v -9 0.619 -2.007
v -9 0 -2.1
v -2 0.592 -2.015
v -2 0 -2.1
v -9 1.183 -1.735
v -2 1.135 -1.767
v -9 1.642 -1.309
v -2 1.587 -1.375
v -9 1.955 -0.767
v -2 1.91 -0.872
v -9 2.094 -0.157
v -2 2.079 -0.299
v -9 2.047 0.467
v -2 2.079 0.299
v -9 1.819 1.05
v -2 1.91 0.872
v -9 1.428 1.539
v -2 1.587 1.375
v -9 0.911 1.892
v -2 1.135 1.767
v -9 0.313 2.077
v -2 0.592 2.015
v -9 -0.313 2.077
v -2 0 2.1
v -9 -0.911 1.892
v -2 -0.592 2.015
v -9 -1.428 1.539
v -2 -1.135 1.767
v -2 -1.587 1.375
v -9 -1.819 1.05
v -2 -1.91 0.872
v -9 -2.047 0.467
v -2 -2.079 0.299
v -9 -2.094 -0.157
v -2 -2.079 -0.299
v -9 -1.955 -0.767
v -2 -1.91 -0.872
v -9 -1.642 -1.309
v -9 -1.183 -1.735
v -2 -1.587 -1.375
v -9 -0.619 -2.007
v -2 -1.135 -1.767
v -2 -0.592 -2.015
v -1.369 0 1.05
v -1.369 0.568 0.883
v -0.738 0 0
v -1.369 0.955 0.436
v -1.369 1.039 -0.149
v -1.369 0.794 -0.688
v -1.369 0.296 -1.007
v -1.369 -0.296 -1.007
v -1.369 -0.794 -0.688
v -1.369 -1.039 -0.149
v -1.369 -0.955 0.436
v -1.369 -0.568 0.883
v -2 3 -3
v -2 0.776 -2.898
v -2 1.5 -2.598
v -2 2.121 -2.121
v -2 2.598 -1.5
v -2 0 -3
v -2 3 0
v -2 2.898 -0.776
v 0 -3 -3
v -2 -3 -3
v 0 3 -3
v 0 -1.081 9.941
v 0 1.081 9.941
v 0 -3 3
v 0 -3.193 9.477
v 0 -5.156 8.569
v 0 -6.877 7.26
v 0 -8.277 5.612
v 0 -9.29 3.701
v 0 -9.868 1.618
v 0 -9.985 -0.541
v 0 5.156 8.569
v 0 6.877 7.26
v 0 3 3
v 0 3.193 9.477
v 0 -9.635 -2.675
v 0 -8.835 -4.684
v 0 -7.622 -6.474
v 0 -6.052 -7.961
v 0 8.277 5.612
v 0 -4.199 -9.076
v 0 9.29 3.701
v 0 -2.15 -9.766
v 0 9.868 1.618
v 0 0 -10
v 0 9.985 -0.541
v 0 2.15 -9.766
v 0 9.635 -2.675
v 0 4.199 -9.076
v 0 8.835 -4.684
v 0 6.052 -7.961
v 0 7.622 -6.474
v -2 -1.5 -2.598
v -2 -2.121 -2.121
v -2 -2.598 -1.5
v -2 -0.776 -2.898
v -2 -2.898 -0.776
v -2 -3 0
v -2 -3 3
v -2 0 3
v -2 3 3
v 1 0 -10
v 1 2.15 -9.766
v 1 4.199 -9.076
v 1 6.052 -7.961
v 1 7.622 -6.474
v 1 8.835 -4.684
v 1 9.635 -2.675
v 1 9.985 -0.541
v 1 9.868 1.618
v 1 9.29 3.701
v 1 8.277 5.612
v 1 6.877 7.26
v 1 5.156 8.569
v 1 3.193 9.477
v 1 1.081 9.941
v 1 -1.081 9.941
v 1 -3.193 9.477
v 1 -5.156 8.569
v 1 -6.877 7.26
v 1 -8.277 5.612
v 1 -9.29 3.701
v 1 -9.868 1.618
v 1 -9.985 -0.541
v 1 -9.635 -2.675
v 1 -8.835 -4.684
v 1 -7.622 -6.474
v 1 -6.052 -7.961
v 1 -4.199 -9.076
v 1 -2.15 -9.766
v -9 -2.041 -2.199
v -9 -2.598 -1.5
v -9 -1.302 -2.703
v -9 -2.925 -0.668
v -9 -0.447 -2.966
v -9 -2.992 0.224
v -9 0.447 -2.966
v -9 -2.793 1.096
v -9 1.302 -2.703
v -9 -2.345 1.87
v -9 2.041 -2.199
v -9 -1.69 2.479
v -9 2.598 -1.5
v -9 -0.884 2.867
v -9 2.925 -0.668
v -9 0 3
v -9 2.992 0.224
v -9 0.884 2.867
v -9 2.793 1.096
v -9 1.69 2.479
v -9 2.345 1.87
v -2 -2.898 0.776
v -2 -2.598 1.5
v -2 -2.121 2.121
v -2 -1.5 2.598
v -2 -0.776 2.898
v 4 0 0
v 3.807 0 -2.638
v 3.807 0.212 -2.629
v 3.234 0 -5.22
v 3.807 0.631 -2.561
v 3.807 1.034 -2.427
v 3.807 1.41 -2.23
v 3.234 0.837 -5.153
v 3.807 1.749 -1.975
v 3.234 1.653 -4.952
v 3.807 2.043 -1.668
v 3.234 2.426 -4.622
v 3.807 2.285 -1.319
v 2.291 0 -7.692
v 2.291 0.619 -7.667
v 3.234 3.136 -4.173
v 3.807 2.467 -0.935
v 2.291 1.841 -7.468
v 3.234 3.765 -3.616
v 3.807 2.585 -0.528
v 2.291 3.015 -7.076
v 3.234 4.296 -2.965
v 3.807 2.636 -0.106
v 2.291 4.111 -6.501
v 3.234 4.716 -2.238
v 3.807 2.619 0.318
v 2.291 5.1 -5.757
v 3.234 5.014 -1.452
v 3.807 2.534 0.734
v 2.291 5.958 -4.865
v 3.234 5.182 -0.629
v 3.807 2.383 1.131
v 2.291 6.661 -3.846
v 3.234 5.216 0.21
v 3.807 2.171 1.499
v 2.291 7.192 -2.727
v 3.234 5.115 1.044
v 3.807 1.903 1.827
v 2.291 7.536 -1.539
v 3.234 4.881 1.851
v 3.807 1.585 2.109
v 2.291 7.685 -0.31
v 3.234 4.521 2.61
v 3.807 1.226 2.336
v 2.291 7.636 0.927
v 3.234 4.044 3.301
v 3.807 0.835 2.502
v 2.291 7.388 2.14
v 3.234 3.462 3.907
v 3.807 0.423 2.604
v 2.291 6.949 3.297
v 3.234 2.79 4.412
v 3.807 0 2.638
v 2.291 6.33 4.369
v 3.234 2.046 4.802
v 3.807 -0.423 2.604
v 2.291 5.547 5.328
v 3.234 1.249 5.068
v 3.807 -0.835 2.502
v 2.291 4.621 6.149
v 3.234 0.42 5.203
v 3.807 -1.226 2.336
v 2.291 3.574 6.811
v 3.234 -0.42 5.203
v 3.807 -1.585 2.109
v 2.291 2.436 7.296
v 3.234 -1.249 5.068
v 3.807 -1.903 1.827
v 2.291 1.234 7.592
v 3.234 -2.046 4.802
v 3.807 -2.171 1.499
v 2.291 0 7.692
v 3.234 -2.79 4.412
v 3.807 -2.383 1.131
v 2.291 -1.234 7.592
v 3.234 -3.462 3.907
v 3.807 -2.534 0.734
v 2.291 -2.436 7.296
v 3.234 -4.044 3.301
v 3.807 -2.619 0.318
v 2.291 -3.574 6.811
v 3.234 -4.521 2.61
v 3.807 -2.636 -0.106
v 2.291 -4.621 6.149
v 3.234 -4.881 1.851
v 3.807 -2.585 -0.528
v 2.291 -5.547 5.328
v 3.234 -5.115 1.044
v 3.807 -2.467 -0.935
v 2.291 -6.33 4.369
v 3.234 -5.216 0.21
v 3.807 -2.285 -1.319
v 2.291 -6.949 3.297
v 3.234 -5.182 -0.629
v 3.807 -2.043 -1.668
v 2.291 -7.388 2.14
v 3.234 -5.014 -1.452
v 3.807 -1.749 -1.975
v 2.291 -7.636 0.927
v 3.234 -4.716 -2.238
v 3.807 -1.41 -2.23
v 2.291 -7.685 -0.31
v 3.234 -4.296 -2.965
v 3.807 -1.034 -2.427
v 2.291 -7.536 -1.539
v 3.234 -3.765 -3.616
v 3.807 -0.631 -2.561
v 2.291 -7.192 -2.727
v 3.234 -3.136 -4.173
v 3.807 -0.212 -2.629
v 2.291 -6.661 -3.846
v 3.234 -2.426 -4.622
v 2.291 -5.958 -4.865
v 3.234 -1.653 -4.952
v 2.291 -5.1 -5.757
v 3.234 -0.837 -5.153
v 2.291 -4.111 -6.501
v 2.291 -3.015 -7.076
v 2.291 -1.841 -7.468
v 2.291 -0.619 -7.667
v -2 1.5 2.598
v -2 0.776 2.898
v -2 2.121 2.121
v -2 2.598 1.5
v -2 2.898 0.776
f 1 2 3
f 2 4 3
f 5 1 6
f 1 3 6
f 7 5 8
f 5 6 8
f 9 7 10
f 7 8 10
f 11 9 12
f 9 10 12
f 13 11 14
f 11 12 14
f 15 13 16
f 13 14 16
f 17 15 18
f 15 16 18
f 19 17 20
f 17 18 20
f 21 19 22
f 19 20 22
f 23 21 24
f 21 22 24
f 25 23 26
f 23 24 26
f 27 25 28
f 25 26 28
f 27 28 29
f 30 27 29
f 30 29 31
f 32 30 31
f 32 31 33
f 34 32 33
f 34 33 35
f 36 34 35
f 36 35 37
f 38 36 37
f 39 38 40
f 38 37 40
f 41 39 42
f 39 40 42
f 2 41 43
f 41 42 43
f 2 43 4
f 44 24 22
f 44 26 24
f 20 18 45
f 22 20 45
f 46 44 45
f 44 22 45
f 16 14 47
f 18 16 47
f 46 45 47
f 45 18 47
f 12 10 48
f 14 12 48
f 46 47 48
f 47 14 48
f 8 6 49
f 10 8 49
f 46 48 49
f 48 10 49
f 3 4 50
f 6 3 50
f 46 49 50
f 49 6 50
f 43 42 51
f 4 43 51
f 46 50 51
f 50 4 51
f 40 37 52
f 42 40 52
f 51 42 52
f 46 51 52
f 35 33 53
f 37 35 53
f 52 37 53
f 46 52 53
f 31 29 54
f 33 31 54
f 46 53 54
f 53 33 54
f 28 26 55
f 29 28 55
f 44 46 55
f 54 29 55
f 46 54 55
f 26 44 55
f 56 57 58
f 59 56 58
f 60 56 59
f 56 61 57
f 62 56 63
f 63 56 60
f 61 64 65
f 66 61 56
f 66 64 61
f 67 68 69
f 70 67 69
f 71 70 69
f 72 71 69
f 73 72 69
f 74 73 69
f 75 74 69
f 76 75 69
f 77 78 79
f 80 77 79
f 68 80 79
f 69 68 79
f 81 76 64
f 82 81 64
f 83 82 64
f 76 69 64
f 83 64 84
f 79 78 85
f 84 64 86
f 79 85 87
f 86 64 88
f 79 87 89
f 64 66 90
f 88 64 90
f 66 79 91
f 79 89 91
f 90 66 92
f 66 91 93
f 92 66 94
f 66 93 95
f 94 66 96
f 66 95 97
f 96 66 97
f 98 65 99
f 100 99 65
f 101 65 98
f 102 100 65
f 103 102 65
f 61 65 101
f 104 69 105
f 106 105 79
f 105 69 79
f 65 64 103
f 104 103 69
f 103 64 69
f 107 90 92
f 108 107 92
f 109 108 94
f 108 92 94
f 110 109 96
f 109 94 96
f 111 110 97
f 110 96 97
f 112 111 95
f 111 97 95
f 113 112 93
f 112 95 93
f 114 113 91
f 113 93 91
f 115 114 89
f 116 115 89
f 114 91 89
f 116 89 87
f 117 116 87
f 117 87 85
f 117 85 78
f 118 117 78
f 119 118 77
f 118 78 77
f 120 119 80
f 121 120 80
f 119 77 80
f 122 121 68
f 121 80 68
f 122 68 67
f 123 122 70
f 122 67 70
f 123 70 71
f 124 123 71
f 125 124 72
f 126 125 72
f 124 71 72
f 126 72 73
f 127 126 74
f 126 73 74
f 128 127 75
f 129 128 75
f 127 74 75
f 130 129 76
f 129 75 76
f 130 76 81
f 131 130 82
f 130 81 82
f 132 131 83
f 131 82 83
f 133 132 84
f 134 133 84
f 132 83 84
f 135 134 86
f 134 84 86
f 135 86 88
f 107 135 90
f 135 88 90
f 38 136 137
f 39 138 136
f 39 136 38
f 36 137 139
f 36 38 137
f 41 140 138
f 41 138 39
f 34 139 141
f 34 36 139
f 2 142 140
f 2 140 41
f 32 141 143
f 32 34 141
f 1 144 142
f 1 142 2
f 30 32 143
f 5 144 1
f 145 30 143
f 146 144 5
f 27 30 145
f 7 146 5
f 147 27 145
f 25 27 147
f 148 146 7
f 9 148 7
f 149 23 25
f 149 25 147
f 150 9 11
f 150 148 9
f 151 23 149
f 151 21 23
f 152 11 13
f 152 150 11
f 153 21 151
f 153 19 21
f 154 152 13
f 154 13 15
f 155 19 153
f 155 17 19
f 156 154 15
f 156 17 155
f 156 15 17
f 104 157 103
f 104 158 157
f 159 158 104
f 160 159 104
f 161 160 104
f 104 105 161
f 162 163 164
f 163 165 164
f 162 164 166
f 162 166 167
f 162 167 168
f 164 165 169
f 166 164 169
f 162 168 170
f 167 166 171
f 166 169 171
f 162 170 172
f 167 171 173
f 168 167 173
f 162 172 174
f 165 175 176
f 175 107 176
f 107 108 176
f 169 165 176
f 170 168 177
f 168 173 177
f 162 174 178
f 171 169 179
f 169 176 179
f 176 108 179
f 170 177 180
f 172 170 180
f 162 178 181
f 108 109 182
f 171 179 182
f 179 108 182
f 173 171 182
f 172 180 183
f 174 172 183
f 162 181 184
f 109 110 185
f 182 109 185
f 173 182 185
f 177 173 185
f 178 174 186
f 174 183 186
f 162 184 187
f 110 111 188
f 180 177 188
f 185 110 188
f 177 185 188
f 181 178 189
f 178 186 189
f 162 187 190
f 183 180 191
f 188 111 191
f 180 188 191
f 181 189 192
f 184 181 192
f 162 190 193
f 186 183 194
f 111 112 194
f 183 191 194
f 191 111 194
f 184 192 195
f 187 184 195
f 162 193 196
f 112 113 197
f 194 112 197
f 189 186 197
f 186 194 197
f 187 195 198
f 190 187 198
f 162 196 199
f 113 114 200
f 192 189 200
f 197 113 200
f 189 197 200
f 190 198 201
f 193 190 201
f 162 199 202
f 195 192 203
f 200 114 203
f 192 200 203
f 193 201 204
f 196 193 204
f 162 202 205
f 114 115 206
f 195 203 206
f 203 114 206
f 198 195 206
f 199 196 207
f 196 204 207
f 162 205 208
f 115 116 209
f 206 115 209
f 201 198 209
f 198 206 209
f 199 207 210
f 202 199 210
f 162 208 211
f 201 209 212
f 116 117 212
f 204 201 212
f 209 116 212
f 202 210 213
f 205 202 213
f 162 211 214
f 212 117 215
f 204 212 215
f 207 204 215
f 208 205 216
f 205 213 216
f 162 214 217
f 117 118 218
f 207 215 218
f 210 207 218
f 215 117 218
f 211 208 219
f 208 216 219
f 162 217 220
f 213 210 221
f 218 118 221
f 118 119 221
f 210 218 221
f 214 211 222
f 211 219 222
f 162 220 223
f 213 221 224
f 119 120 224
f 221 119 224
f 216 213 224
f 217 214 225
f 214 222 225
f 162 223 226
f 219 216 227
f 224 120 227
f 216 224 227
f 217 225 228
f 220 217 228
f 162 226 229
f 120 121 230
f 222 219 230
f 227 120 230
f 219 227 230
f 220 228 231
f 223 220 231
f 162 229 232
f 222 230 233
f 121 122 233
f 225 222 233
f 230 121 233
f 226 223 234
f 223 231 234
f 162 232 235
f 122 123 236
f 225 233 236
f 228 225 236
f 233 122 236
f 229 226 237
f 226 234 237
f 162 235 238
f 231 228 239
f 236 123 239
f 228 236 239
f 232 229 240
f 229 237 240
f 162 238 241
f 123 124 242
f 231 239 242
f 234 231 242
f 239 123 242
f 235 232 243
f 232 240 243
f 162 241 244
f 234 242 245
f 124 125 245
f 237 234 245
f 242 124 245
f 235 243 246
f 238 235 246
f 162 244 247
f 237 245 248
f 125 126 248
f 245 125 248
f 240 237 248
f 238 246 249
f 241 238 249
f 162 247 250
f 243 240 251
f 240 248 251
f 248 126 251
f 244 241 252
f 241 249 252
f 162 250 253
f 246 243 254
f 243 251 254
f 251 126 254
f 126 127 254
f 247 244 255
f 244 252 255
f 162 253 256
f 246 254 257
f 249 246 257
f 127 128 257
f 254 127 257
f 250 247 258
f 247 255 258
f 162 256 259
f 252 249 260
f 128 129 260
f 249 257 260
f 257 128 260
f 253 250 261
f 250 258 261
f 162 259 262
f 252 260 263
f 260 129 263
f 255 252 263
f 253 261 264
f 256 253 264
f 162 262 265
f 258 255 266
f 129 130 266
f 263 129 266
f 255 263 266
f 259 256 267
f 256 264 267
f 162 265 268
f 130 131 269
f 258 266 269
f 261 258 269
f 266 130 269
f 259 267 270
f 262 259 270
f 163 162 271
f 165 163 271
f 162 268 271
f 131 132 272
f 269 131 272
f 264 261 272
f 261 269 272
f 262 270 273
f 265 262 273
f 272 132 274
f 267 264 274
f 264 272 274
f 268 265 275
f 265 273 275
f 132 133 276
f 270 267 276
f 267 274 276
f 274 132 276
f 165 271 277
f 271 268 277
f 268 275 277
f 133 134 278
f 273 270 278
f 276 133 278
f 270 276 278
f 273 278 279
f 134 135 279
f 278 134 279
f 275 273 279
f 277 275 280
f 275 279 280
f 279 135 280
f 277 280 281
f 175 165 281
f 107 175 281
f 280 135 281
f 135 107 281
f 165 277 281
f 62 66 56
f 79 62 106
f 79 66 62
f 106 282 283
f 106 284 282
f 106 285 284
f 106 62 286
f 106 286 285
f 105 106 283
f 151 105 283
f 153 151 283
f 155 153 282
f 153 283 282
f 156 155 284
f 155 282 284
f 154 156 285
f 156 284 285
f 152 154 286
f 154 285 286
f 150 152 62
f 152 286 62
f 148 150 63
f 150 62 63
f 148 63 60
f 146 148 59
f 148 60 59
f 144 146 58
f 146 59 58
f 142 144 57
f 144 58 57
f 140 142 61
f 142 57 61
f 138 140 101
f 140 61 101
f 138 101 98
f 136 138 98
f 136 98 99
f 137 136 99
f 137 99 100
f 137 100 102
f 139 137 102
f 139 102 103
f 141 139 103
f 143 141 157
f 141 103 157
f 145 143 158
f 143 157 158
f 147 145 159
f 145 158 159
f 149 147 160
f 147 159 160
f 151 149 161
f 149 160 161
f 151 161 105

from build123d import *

# Parameters (mm, degrees)
SKETCH1_R             = 10
BOSS_EXTRUDE1_DEPTH   = 1
SKETCH3_W             = 6
SKETCH3_H             = 6
BOSS_EXTRUDE2_DEPTH   = 2
SKETCH4_R             = 3
BOSS_EXTRUDE3_DEPTH   = 7
M5_TAPPED_HOLE1_D     = 4.2
M5_TAPPED_HOLE1_DEPTH = 7
M5_TAPPED_HOLE1_TIP   = 1.2618073


with BuildPart() as part:
    # Sketch1 → Boss-Extrude1 (new body)
    with BuildSketch(Plane(origin=(0, 0, 0), x_dir=(0, 0, -1), z_dir=(1, 0, 0))):
        Circle(SKETCH1_R)
    extrude(amount=BOSS_EXTRUDE1_DEPTH)

    # Sketch2 → Revolve1 (revolve)
    with BuildSketch(Plane(origin=(0, 0, 0), x_dir=(1, 0, 0), z_dir=(0, 1, 0))):
        with BuildLine():
            Line((1, 0), (4, 0))
            ThreePointArc((4, 0), (3.233844182, 5.220153254), (1, 10))
            Line((1, 10), (1, 0))
        make_face()
    revolve(axis=Axis((1, 0, 0), (1, 0, 0)))

    # Sketch3 → Boss-Extrude2 (add)
    with BuildSketch(Plane.ZY):
        Rectangle(SKETCH3_W, SKETCH3_H)
    extrude(amount=BOSS_EXTRUDE2_DEPTH)

    # Sketch4 → Boss-Extrude3 (add)
    with BuildSketch(Plane.ZY.offset(2)):
        Circle(SKETCH4_R)
    extrude(amount=BOSS_EXTRUDE3_DEPTH)

    # M5 Tapped Hole1
    with Locations(Plane.ZY.offset(9)):
        with Locations((0, 0)):
            Hole(M5_TAPPED_HOLE1_D / 2, depth=M5_TAPPED_HOLE1_DEPTH)
            with Locations((0, 0, -(M5_TAPPED_HOLE1_DEPTH + M5_TAPPED_HOLE1_TIP / 2))):  # 118° drill point
                Cone(0, M5_TAPPED_HOLE1_D / 2, M5_TAPPED_HOLE1_TIP, mode=Mode.SUBTRACT)


solid = part.part
